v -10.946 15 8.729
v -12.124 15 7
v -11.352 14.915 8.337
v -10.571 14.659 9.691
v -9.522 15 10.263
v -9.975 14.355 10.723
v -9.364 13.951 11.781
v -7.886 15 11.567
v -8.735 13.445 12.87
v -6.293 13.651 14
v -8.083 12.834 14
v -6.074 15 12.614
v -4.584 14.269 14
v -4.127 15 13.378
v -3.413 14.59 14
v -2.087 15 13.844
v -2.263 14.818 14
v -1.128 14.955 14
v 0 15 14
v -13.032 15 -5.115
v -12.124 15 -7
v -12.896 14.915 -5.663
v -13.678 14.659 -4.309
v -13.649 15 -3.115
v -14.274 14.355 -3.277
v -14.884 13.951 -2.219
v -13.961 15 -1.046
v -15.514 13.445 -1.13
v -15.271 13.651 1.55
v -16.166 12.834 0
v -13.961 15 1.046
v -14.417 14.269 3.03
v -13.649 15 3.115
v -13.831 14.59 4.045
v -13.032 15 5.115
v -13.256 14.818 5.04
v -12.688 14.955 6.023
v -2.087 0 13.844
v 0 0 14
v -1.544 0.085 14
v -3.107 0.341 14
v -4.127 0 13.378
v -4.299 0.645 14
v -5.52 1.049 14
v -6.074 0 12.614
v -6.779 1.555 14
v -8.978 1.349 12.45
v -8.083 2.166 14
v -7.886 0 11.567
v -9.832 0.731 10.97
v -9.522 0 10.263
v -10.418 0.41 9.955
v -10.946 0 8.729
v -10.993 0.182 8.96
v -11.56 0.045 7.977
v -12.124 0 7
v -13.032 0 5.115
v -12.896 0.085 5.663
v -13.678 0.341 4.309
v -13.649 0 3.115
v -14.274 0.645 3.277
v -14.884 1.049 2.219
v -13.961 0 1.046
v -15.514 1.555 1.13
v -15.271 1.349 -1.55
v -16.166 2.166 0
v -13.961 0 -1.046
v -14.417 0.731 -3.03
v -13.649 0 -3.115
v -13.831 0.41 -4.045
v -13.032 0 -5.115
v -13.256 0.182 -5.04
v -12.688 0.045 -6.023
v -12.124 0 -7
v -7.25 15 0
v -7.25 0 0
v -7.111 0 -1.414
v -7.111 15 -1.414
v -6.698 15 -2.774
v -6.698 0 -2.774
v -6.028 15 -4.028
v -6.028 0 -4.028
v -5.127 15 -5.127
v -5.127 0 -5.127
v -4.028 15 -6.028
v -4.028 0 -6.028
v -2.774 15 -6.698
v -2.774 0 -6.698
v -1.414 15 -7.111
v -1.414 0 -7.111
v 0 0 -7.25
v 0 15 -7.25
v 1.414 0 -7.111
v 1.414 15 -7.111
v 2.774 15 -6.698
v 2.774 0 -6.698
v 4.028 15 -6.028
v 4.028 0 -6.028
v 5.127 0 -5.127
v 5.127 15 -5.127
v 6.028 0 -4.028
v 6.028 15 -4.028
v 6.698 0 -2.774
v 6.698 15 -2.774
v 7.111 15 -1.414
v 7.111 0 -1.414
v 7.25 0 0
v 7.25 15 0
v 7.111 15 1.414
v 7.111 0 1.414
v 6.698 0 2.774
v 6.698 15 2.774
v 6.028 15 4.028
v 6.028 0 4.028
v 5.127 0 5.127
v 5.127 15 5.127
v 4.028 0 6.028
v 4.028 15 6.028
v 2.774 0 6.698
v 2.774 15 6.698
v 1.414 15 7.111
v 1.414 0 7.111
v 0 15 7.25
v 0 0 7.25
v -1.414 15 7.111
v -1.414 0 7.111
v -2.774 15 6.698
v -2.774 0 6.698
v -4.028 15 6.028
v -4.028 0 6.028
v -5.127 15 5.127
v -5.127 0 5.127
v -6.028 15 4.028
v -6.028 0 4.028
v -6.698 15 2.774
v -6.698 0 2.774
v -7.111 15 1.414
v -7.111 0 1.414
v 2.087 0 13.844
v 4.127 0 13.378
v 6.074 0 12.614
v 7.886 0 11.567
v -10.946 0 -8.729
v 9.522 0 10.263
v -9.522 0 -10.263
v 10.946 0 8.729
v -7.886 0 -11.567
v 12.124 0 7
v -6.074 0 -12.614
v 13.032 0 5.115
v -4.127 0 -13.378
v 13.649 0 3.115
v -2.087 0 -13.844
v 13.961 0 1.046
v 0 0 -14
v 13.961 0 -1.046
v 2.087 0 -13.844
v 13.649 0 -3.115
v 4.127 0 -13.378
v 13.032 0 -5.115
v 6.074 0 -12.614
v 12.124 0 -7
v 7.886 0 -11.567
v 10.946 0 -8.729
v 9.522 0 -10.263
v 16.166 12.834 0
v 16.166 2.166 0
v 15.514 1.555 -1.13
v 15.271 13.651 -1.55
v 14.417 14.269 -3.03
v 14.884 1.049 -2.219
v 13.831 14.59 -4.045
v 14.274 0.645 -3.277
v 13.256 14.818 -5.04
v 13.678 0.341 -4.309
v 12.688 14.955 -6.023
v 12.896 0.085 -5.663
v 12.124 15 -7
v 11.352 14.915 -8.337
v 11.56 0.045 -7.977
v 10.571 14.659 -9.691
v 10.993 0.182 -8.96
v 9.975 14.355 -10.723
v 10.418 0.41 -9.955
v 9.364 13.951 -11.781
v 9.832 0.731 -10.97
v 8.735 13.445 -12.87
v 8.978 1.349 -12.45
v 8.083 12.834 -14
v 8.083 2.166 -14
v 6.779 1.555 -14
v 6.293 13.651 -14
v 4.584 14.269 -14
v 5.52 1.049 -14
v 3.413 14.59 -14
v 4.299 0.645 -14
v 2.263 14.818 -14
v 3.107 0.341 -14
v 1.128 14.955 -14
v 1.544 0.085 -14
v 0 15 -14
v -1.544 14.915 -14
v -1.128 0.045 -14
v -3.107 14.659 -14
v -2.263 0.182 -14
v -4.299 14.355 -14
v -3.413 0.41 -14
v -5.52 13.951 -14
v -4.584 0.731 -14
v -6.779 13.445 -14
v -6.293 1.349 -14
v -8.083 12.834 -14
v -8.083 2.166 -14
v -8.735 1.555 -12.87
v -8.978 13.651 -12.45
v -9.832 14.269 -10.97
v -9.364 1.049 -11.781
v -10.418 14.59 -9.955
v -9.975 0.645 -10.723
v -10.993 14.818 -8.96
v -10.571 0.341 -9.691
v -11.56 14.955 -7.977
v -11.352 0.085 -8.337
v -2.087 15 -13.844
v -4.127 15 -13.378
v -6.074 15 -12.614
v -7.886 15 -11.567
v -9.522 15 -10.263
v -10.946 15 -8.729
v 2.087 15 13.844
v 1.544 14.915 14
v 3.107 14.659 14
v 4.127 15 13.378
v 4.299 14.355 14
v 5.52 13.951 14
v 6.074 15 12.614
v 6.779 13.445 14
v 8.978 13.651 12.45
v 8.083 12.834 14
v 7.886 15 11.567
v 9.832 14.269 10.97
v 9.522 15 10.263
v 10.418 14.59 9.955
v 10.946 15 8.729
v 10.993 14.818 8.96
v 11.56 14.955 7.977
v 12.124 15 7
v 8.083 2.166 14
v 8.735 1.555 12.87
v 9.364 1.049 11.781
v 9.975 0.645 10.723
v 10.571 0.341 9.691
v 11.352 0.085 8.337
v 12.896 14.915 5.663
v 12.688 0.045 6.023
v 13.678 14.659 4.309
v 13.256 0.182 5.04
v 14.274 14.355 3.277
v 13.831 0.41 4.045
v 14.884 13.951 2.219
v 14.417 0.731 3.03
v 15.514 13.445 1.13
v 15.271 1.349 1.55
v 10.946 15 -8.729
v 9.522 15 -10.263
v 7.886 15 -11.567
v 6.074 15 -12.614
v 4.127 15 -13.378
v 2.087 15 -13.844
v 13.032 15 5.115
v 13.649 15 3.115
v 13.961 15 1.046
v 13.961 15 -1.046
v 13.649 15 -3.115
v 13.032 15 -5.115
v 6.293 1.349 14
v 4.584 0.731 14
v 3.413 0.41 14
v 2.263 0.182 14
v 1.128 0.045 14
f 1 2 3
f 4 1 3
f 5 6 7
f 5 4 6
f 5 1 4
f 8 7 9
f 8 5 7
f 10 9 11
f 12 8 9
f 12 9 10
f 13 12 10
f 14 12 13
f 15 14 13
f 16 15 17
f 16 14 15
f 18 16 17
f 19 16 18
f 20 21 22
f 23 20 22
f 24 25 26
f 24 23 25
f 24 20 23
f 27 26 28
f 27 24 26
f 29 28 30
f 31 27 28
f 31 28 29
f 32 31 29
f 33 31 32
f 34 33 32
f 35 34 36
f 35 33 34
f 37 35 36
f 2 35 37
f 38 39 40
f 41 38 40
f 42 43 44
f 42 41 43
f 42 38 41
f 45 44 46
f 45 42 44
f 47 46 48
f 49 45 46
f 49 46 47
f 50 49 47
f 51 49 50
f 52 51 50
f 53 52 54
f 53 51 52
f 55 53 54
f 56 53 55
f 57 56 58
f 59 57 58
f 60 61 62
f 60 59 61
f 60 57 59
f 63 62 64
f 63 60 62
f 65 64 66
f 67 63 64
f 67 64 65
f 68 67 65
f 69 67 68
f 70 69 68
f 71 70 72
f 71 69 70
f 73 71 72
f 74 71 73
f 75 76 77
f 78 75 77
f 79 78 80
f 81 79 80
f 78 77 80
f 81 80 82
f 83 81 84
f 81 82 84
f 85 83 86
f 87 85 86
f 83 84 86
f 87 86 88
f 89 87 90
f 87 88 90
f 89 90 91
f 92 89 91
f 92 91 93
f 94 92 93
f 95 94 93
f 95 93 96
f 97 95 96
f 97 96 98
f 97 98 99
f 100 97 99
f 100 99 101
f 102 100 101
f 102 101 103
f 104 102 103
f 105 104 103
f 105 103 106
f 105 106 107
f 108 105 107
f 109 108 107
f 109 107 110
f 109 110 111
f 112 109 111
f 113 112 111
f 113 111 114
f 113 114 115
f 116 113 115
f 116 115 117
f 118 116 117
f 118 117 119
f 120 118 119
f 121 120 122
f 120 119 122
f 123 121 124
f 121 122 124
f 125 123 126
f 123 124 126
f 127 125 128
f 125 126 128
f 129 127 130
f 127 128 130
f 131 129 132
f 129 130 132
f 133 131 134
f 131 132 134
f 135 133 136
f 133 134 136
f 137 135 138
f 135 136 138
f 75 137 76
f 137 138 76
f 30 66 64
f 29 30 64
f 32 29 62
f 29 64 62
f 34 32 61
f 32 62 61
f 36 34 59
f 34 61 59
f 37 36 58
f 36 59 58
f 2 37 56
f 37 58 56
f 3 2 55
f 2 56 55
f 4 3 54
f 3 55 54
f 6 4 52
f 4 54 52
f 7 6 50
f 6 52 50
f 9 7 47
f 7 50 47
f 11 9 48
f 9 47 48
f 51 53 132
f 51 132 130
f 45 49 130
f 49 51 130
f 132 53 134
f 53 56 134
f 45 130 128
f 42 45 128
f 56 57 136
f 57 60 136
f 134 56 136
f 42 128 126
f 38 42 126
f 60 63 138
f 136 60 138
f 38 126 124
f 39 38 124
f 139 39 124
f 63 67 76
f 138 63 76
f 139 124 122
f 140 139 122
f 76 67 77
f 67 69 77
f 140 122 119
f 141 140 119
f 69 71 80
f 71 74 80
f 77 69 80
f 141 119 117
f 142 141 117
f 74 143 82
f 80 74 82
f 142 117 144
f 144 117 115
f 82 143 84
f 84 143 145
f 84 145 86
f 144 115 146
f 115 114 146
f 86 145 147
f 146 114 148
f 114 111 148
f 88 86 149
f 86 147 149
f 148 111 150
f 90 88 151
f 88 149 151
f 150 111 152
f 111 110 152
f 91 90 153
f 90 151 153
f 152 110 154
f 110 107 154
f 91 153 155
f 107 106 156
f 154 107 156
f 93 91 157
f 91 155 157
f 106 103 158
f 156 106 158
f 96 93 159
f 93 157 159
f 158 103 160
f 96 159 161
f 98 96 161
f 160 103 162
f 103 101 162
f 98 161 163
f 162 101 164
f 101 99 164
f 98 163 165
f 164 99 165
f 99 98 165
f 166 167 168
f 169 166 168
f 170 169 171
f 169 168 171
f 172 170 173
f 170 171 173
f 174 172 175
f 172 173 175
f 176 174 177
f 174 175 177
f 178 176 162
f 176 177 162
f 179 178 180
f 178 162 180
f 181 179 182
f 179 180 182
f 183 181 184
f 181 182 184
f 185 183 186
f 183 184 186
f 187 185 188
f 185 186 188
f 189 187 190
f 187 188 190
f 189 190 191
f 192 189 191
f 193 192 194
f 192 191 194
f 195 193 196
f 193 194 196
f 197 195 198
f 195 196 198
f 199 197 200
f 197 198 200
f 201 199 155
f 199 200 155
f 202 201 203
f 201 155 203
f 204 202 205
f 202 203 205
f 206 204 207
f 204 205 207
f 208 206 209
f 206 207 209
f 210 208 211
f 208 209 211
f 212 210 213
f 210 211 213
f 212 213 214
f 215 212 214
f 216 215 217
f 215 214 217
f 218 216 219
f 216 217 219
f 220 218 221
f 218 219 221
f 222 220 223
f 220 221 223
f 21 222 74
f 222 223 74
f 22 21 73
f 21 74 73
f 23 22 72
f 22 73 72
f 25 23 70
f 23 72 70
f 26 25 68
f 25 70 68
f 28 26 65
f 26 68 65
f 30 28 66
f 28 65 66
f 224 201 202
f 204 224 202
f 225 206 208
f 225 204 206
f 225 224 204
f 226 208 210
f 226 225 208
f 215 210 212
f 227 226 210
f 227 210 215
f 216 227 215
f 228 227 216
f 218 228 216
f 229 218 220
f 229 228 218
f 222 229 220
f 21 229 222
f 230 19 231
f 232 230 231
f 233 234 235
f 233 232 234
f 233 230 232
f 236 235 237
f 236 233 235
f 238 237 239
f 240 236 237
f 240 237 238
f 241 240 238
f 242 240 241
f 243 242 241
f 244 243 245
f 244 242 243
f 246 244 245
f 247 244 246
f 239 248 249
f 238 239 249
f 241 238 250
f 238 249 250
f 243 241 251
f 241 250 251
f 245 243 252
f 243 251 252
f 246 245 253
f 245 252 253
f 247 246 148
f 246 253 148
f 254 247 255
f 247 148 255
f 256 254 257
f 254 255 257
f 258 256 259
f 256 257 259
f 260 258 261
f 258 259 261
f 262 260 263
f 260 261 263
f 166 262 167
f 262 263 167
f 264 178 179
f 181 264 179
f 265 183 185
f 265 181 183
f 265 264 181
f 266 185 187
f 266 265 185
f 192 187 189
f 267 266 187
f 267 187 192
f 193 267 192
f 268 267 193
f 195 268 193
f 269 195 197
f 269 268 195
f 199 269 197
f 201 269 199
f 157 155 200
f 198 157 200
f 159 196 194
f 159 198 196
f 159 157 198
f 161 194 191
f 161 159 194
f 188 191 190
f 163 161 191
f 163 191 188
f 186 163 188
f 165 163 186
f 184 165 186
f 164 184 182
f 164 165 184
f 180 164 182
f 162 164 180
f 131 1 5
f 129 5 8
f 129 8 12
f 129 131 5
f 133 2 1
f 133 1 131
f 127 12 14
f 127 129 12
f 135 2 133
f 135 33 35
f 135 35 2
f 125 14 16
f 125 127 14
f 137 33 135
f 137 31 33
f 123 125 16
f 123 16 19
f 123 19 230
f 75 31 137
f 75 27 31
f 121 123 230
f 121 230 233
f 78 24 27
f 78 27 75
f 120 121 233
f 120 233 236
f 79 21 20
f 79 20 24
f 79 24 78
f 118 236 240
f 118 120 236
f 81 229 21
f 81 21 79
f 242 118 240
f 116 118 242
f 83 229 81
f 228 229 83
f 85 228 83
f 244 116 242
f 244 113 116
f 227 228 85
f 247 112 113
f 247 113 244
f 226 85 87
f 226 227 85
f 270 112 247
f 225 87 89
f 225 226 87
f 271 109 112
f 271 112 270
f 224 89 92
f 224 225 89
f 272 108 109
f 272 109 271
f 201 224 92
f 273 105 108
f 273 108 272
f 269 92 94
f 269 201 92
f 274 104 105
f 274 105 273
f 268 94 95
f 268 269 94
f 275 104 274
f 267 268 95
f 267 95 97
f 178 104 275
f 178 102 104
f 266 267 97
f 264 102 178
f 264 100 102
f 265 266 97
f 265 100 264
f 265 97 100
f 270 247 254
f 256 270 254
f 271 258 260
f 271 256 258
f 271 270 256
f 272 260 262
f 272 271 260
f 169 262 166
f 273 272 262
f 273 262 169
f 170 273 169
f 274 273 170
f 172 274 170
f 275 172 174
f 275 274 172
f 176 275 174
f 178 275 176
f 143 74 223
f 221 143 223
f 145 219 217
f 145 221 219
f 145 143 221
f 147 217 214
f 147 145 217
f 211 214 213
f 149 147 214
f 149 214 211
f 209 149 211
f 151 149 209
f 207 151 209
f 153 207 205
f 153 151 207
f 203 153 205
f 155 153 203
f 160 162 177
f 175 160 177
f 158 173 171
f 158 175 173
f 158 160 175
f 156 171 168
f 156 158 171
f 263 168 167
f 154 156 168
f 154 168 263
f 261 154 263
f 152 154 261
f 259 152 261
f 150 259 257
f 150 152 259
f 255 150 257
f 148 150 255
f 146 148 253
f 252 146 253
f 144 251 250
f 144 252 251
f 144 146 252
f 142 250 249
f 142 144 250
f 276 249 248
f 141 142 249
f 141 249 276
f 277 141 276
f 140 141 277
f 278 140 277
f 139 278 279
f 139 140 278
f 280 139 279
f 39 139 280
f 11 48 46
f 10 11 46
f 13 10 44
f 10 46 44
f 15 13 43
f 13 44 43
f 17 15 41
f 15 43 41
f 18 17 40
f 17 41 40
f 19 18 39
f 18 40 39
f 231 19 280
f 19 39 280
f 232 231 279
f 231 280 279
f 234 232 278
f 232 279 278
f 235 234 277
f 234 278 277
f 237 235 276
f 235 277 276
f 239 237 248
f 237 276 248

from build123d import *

# Parameters (mm, degrees)
BOSS_EXTRUDE1_DEPTH     = 15
SKETCH2_OUTSIDE_W       = 73.396
SKETCH2_OUTSIDE_H       = 69.064
SKETCH2_OUTSIDE_R       = 14
CUT_EXTRUDE1_DEPTH      = 15
CUT_EXTRUDE1_DRAFT      = -45
MIRROR1_COPY_1_SKETCH_W = 73.396
MIRROR1_COPY_1_SKETCH_H = 69.064
MIRROR1_COPY_1_SKETCH_R = 14
MIRROR1_COPY_1_DEPTH    = 15
MIRROR1_COPY_1_DRAFT    = -45
M16X1_5_TAPPED_HOLE1_D  = 14.5


with BuildPart() as part:
    # Sketch1 → Boss-Extrude1 (new body)
    with BuildSketch(Plane(origin=(0, 0, 0), x_dir=(1, 0, 0), z_dir=(0, 1, 0))):
        Polygon((16.165807537, 0), (8.082903769, 14), (-8.082903769, 14), (-16.165807537, 0), (-8.082903769, -14), (8.082903769, -14), align=None)
    extrude(amount=BOSS_EXTRUDE1_DEPTH)


with BuildPart() as cut_extrude1_tool:
    # Sketch2 outside → Cut-Extrude1 (with draft: the straight prism first)
    with BuildSketch(Plane(origin=(0, 15, 0), x_dir=(1, 0, 0), z_dir=(0, 1, 0))):
        Rectangle(SKETCH2_OUTSIDE_W, SKETCH2_OUTSIDE_H)
        Circle(SKETCH2_OUTSIDE_R, mode=Mode.SUBTRACT)
    extrude(amount=-CUT_EXTRUDE1_DEPTH)
    # Cut-Extrude1: the draft: its side faces are tilted about the plane it starts from
    cut_extrude1_sides = [cut_extrude1_tool.faces().sort_by_distance(p)[0] for p in [
        (0, 7.5, 34.532),
        (36.698, 7.5, 0),
        (0, 7.5, -34.532),
        (-36.698, 7.5, 0),
        (-14, 7.5, 0),
    ]]
    draft(cut_extrude1_sides, Plane(origin=(0, 15, 0), x_dir=(1, 0, 0), z_dir=(0, 1, 0)), CUT_EXTRUDE1_DRAFT)


with BuildPart() as part_1:
    add(part.part)

    # Cut-Extrude1: cut by cut_extrude1_tool
    add(cut_extrude1_tool.part, mode=Mode.SUBTRACT)


with BuildPart() as mirror1_copy_1_tool:
    # Mirror1 copy 1 sketch → Mirror1 copy 1 (with draft: the straight prism first)
    with BuildSketch(Plane.XZ):
        Rectangle(MIRROR1_COPY_1_SKETCH_W, MIRROR1_COPY_1_SKETCH_H)
        Circle(MIRROR1_COPY_1_SKETCH_R, mode=Mode.SUBTRACT)
    extrude(amount=-MIRROR1_COPY_1_DEPTH)
    # Mirror1 copy 1: the draft: its side faces are tilted about the plane it starts from
    mirror1_copy_1_sides = [mirror1_copy_1_tool.faces().sort_by_distance(p)[0] for p in [
        (0, 7.5, 34.532),
        (36.698, 7.5, 0),
        (0, 7.5, -34.532),
        (-36.698, 7.5, 0),
        (-14, 7.5, 0),
    ]]
    draft(mirror1_copy_1_sides, Plane.XZ, MIRROR1_COPY_1_DRAFT)


with BuildPart() as part_2:
    add(part_1.part)

    # Mirror1 copy 1: cut by mirror1_copy_1_tool
    add(mirror1_copy_1_tool.part, mode=Mode.SUBTRACT)

    # M16x1.5 Tapped Hole1 (through all)
    with Locations(Plane(origin=(0, 15, 0), x_dir=(1, 0, 0), z_dir=(0, 1, 0))):
        with Locations((0, 0)):
            Hole(M16X1_5_TAPPED_HOLE1_D / 2)


solid = part_2.part
